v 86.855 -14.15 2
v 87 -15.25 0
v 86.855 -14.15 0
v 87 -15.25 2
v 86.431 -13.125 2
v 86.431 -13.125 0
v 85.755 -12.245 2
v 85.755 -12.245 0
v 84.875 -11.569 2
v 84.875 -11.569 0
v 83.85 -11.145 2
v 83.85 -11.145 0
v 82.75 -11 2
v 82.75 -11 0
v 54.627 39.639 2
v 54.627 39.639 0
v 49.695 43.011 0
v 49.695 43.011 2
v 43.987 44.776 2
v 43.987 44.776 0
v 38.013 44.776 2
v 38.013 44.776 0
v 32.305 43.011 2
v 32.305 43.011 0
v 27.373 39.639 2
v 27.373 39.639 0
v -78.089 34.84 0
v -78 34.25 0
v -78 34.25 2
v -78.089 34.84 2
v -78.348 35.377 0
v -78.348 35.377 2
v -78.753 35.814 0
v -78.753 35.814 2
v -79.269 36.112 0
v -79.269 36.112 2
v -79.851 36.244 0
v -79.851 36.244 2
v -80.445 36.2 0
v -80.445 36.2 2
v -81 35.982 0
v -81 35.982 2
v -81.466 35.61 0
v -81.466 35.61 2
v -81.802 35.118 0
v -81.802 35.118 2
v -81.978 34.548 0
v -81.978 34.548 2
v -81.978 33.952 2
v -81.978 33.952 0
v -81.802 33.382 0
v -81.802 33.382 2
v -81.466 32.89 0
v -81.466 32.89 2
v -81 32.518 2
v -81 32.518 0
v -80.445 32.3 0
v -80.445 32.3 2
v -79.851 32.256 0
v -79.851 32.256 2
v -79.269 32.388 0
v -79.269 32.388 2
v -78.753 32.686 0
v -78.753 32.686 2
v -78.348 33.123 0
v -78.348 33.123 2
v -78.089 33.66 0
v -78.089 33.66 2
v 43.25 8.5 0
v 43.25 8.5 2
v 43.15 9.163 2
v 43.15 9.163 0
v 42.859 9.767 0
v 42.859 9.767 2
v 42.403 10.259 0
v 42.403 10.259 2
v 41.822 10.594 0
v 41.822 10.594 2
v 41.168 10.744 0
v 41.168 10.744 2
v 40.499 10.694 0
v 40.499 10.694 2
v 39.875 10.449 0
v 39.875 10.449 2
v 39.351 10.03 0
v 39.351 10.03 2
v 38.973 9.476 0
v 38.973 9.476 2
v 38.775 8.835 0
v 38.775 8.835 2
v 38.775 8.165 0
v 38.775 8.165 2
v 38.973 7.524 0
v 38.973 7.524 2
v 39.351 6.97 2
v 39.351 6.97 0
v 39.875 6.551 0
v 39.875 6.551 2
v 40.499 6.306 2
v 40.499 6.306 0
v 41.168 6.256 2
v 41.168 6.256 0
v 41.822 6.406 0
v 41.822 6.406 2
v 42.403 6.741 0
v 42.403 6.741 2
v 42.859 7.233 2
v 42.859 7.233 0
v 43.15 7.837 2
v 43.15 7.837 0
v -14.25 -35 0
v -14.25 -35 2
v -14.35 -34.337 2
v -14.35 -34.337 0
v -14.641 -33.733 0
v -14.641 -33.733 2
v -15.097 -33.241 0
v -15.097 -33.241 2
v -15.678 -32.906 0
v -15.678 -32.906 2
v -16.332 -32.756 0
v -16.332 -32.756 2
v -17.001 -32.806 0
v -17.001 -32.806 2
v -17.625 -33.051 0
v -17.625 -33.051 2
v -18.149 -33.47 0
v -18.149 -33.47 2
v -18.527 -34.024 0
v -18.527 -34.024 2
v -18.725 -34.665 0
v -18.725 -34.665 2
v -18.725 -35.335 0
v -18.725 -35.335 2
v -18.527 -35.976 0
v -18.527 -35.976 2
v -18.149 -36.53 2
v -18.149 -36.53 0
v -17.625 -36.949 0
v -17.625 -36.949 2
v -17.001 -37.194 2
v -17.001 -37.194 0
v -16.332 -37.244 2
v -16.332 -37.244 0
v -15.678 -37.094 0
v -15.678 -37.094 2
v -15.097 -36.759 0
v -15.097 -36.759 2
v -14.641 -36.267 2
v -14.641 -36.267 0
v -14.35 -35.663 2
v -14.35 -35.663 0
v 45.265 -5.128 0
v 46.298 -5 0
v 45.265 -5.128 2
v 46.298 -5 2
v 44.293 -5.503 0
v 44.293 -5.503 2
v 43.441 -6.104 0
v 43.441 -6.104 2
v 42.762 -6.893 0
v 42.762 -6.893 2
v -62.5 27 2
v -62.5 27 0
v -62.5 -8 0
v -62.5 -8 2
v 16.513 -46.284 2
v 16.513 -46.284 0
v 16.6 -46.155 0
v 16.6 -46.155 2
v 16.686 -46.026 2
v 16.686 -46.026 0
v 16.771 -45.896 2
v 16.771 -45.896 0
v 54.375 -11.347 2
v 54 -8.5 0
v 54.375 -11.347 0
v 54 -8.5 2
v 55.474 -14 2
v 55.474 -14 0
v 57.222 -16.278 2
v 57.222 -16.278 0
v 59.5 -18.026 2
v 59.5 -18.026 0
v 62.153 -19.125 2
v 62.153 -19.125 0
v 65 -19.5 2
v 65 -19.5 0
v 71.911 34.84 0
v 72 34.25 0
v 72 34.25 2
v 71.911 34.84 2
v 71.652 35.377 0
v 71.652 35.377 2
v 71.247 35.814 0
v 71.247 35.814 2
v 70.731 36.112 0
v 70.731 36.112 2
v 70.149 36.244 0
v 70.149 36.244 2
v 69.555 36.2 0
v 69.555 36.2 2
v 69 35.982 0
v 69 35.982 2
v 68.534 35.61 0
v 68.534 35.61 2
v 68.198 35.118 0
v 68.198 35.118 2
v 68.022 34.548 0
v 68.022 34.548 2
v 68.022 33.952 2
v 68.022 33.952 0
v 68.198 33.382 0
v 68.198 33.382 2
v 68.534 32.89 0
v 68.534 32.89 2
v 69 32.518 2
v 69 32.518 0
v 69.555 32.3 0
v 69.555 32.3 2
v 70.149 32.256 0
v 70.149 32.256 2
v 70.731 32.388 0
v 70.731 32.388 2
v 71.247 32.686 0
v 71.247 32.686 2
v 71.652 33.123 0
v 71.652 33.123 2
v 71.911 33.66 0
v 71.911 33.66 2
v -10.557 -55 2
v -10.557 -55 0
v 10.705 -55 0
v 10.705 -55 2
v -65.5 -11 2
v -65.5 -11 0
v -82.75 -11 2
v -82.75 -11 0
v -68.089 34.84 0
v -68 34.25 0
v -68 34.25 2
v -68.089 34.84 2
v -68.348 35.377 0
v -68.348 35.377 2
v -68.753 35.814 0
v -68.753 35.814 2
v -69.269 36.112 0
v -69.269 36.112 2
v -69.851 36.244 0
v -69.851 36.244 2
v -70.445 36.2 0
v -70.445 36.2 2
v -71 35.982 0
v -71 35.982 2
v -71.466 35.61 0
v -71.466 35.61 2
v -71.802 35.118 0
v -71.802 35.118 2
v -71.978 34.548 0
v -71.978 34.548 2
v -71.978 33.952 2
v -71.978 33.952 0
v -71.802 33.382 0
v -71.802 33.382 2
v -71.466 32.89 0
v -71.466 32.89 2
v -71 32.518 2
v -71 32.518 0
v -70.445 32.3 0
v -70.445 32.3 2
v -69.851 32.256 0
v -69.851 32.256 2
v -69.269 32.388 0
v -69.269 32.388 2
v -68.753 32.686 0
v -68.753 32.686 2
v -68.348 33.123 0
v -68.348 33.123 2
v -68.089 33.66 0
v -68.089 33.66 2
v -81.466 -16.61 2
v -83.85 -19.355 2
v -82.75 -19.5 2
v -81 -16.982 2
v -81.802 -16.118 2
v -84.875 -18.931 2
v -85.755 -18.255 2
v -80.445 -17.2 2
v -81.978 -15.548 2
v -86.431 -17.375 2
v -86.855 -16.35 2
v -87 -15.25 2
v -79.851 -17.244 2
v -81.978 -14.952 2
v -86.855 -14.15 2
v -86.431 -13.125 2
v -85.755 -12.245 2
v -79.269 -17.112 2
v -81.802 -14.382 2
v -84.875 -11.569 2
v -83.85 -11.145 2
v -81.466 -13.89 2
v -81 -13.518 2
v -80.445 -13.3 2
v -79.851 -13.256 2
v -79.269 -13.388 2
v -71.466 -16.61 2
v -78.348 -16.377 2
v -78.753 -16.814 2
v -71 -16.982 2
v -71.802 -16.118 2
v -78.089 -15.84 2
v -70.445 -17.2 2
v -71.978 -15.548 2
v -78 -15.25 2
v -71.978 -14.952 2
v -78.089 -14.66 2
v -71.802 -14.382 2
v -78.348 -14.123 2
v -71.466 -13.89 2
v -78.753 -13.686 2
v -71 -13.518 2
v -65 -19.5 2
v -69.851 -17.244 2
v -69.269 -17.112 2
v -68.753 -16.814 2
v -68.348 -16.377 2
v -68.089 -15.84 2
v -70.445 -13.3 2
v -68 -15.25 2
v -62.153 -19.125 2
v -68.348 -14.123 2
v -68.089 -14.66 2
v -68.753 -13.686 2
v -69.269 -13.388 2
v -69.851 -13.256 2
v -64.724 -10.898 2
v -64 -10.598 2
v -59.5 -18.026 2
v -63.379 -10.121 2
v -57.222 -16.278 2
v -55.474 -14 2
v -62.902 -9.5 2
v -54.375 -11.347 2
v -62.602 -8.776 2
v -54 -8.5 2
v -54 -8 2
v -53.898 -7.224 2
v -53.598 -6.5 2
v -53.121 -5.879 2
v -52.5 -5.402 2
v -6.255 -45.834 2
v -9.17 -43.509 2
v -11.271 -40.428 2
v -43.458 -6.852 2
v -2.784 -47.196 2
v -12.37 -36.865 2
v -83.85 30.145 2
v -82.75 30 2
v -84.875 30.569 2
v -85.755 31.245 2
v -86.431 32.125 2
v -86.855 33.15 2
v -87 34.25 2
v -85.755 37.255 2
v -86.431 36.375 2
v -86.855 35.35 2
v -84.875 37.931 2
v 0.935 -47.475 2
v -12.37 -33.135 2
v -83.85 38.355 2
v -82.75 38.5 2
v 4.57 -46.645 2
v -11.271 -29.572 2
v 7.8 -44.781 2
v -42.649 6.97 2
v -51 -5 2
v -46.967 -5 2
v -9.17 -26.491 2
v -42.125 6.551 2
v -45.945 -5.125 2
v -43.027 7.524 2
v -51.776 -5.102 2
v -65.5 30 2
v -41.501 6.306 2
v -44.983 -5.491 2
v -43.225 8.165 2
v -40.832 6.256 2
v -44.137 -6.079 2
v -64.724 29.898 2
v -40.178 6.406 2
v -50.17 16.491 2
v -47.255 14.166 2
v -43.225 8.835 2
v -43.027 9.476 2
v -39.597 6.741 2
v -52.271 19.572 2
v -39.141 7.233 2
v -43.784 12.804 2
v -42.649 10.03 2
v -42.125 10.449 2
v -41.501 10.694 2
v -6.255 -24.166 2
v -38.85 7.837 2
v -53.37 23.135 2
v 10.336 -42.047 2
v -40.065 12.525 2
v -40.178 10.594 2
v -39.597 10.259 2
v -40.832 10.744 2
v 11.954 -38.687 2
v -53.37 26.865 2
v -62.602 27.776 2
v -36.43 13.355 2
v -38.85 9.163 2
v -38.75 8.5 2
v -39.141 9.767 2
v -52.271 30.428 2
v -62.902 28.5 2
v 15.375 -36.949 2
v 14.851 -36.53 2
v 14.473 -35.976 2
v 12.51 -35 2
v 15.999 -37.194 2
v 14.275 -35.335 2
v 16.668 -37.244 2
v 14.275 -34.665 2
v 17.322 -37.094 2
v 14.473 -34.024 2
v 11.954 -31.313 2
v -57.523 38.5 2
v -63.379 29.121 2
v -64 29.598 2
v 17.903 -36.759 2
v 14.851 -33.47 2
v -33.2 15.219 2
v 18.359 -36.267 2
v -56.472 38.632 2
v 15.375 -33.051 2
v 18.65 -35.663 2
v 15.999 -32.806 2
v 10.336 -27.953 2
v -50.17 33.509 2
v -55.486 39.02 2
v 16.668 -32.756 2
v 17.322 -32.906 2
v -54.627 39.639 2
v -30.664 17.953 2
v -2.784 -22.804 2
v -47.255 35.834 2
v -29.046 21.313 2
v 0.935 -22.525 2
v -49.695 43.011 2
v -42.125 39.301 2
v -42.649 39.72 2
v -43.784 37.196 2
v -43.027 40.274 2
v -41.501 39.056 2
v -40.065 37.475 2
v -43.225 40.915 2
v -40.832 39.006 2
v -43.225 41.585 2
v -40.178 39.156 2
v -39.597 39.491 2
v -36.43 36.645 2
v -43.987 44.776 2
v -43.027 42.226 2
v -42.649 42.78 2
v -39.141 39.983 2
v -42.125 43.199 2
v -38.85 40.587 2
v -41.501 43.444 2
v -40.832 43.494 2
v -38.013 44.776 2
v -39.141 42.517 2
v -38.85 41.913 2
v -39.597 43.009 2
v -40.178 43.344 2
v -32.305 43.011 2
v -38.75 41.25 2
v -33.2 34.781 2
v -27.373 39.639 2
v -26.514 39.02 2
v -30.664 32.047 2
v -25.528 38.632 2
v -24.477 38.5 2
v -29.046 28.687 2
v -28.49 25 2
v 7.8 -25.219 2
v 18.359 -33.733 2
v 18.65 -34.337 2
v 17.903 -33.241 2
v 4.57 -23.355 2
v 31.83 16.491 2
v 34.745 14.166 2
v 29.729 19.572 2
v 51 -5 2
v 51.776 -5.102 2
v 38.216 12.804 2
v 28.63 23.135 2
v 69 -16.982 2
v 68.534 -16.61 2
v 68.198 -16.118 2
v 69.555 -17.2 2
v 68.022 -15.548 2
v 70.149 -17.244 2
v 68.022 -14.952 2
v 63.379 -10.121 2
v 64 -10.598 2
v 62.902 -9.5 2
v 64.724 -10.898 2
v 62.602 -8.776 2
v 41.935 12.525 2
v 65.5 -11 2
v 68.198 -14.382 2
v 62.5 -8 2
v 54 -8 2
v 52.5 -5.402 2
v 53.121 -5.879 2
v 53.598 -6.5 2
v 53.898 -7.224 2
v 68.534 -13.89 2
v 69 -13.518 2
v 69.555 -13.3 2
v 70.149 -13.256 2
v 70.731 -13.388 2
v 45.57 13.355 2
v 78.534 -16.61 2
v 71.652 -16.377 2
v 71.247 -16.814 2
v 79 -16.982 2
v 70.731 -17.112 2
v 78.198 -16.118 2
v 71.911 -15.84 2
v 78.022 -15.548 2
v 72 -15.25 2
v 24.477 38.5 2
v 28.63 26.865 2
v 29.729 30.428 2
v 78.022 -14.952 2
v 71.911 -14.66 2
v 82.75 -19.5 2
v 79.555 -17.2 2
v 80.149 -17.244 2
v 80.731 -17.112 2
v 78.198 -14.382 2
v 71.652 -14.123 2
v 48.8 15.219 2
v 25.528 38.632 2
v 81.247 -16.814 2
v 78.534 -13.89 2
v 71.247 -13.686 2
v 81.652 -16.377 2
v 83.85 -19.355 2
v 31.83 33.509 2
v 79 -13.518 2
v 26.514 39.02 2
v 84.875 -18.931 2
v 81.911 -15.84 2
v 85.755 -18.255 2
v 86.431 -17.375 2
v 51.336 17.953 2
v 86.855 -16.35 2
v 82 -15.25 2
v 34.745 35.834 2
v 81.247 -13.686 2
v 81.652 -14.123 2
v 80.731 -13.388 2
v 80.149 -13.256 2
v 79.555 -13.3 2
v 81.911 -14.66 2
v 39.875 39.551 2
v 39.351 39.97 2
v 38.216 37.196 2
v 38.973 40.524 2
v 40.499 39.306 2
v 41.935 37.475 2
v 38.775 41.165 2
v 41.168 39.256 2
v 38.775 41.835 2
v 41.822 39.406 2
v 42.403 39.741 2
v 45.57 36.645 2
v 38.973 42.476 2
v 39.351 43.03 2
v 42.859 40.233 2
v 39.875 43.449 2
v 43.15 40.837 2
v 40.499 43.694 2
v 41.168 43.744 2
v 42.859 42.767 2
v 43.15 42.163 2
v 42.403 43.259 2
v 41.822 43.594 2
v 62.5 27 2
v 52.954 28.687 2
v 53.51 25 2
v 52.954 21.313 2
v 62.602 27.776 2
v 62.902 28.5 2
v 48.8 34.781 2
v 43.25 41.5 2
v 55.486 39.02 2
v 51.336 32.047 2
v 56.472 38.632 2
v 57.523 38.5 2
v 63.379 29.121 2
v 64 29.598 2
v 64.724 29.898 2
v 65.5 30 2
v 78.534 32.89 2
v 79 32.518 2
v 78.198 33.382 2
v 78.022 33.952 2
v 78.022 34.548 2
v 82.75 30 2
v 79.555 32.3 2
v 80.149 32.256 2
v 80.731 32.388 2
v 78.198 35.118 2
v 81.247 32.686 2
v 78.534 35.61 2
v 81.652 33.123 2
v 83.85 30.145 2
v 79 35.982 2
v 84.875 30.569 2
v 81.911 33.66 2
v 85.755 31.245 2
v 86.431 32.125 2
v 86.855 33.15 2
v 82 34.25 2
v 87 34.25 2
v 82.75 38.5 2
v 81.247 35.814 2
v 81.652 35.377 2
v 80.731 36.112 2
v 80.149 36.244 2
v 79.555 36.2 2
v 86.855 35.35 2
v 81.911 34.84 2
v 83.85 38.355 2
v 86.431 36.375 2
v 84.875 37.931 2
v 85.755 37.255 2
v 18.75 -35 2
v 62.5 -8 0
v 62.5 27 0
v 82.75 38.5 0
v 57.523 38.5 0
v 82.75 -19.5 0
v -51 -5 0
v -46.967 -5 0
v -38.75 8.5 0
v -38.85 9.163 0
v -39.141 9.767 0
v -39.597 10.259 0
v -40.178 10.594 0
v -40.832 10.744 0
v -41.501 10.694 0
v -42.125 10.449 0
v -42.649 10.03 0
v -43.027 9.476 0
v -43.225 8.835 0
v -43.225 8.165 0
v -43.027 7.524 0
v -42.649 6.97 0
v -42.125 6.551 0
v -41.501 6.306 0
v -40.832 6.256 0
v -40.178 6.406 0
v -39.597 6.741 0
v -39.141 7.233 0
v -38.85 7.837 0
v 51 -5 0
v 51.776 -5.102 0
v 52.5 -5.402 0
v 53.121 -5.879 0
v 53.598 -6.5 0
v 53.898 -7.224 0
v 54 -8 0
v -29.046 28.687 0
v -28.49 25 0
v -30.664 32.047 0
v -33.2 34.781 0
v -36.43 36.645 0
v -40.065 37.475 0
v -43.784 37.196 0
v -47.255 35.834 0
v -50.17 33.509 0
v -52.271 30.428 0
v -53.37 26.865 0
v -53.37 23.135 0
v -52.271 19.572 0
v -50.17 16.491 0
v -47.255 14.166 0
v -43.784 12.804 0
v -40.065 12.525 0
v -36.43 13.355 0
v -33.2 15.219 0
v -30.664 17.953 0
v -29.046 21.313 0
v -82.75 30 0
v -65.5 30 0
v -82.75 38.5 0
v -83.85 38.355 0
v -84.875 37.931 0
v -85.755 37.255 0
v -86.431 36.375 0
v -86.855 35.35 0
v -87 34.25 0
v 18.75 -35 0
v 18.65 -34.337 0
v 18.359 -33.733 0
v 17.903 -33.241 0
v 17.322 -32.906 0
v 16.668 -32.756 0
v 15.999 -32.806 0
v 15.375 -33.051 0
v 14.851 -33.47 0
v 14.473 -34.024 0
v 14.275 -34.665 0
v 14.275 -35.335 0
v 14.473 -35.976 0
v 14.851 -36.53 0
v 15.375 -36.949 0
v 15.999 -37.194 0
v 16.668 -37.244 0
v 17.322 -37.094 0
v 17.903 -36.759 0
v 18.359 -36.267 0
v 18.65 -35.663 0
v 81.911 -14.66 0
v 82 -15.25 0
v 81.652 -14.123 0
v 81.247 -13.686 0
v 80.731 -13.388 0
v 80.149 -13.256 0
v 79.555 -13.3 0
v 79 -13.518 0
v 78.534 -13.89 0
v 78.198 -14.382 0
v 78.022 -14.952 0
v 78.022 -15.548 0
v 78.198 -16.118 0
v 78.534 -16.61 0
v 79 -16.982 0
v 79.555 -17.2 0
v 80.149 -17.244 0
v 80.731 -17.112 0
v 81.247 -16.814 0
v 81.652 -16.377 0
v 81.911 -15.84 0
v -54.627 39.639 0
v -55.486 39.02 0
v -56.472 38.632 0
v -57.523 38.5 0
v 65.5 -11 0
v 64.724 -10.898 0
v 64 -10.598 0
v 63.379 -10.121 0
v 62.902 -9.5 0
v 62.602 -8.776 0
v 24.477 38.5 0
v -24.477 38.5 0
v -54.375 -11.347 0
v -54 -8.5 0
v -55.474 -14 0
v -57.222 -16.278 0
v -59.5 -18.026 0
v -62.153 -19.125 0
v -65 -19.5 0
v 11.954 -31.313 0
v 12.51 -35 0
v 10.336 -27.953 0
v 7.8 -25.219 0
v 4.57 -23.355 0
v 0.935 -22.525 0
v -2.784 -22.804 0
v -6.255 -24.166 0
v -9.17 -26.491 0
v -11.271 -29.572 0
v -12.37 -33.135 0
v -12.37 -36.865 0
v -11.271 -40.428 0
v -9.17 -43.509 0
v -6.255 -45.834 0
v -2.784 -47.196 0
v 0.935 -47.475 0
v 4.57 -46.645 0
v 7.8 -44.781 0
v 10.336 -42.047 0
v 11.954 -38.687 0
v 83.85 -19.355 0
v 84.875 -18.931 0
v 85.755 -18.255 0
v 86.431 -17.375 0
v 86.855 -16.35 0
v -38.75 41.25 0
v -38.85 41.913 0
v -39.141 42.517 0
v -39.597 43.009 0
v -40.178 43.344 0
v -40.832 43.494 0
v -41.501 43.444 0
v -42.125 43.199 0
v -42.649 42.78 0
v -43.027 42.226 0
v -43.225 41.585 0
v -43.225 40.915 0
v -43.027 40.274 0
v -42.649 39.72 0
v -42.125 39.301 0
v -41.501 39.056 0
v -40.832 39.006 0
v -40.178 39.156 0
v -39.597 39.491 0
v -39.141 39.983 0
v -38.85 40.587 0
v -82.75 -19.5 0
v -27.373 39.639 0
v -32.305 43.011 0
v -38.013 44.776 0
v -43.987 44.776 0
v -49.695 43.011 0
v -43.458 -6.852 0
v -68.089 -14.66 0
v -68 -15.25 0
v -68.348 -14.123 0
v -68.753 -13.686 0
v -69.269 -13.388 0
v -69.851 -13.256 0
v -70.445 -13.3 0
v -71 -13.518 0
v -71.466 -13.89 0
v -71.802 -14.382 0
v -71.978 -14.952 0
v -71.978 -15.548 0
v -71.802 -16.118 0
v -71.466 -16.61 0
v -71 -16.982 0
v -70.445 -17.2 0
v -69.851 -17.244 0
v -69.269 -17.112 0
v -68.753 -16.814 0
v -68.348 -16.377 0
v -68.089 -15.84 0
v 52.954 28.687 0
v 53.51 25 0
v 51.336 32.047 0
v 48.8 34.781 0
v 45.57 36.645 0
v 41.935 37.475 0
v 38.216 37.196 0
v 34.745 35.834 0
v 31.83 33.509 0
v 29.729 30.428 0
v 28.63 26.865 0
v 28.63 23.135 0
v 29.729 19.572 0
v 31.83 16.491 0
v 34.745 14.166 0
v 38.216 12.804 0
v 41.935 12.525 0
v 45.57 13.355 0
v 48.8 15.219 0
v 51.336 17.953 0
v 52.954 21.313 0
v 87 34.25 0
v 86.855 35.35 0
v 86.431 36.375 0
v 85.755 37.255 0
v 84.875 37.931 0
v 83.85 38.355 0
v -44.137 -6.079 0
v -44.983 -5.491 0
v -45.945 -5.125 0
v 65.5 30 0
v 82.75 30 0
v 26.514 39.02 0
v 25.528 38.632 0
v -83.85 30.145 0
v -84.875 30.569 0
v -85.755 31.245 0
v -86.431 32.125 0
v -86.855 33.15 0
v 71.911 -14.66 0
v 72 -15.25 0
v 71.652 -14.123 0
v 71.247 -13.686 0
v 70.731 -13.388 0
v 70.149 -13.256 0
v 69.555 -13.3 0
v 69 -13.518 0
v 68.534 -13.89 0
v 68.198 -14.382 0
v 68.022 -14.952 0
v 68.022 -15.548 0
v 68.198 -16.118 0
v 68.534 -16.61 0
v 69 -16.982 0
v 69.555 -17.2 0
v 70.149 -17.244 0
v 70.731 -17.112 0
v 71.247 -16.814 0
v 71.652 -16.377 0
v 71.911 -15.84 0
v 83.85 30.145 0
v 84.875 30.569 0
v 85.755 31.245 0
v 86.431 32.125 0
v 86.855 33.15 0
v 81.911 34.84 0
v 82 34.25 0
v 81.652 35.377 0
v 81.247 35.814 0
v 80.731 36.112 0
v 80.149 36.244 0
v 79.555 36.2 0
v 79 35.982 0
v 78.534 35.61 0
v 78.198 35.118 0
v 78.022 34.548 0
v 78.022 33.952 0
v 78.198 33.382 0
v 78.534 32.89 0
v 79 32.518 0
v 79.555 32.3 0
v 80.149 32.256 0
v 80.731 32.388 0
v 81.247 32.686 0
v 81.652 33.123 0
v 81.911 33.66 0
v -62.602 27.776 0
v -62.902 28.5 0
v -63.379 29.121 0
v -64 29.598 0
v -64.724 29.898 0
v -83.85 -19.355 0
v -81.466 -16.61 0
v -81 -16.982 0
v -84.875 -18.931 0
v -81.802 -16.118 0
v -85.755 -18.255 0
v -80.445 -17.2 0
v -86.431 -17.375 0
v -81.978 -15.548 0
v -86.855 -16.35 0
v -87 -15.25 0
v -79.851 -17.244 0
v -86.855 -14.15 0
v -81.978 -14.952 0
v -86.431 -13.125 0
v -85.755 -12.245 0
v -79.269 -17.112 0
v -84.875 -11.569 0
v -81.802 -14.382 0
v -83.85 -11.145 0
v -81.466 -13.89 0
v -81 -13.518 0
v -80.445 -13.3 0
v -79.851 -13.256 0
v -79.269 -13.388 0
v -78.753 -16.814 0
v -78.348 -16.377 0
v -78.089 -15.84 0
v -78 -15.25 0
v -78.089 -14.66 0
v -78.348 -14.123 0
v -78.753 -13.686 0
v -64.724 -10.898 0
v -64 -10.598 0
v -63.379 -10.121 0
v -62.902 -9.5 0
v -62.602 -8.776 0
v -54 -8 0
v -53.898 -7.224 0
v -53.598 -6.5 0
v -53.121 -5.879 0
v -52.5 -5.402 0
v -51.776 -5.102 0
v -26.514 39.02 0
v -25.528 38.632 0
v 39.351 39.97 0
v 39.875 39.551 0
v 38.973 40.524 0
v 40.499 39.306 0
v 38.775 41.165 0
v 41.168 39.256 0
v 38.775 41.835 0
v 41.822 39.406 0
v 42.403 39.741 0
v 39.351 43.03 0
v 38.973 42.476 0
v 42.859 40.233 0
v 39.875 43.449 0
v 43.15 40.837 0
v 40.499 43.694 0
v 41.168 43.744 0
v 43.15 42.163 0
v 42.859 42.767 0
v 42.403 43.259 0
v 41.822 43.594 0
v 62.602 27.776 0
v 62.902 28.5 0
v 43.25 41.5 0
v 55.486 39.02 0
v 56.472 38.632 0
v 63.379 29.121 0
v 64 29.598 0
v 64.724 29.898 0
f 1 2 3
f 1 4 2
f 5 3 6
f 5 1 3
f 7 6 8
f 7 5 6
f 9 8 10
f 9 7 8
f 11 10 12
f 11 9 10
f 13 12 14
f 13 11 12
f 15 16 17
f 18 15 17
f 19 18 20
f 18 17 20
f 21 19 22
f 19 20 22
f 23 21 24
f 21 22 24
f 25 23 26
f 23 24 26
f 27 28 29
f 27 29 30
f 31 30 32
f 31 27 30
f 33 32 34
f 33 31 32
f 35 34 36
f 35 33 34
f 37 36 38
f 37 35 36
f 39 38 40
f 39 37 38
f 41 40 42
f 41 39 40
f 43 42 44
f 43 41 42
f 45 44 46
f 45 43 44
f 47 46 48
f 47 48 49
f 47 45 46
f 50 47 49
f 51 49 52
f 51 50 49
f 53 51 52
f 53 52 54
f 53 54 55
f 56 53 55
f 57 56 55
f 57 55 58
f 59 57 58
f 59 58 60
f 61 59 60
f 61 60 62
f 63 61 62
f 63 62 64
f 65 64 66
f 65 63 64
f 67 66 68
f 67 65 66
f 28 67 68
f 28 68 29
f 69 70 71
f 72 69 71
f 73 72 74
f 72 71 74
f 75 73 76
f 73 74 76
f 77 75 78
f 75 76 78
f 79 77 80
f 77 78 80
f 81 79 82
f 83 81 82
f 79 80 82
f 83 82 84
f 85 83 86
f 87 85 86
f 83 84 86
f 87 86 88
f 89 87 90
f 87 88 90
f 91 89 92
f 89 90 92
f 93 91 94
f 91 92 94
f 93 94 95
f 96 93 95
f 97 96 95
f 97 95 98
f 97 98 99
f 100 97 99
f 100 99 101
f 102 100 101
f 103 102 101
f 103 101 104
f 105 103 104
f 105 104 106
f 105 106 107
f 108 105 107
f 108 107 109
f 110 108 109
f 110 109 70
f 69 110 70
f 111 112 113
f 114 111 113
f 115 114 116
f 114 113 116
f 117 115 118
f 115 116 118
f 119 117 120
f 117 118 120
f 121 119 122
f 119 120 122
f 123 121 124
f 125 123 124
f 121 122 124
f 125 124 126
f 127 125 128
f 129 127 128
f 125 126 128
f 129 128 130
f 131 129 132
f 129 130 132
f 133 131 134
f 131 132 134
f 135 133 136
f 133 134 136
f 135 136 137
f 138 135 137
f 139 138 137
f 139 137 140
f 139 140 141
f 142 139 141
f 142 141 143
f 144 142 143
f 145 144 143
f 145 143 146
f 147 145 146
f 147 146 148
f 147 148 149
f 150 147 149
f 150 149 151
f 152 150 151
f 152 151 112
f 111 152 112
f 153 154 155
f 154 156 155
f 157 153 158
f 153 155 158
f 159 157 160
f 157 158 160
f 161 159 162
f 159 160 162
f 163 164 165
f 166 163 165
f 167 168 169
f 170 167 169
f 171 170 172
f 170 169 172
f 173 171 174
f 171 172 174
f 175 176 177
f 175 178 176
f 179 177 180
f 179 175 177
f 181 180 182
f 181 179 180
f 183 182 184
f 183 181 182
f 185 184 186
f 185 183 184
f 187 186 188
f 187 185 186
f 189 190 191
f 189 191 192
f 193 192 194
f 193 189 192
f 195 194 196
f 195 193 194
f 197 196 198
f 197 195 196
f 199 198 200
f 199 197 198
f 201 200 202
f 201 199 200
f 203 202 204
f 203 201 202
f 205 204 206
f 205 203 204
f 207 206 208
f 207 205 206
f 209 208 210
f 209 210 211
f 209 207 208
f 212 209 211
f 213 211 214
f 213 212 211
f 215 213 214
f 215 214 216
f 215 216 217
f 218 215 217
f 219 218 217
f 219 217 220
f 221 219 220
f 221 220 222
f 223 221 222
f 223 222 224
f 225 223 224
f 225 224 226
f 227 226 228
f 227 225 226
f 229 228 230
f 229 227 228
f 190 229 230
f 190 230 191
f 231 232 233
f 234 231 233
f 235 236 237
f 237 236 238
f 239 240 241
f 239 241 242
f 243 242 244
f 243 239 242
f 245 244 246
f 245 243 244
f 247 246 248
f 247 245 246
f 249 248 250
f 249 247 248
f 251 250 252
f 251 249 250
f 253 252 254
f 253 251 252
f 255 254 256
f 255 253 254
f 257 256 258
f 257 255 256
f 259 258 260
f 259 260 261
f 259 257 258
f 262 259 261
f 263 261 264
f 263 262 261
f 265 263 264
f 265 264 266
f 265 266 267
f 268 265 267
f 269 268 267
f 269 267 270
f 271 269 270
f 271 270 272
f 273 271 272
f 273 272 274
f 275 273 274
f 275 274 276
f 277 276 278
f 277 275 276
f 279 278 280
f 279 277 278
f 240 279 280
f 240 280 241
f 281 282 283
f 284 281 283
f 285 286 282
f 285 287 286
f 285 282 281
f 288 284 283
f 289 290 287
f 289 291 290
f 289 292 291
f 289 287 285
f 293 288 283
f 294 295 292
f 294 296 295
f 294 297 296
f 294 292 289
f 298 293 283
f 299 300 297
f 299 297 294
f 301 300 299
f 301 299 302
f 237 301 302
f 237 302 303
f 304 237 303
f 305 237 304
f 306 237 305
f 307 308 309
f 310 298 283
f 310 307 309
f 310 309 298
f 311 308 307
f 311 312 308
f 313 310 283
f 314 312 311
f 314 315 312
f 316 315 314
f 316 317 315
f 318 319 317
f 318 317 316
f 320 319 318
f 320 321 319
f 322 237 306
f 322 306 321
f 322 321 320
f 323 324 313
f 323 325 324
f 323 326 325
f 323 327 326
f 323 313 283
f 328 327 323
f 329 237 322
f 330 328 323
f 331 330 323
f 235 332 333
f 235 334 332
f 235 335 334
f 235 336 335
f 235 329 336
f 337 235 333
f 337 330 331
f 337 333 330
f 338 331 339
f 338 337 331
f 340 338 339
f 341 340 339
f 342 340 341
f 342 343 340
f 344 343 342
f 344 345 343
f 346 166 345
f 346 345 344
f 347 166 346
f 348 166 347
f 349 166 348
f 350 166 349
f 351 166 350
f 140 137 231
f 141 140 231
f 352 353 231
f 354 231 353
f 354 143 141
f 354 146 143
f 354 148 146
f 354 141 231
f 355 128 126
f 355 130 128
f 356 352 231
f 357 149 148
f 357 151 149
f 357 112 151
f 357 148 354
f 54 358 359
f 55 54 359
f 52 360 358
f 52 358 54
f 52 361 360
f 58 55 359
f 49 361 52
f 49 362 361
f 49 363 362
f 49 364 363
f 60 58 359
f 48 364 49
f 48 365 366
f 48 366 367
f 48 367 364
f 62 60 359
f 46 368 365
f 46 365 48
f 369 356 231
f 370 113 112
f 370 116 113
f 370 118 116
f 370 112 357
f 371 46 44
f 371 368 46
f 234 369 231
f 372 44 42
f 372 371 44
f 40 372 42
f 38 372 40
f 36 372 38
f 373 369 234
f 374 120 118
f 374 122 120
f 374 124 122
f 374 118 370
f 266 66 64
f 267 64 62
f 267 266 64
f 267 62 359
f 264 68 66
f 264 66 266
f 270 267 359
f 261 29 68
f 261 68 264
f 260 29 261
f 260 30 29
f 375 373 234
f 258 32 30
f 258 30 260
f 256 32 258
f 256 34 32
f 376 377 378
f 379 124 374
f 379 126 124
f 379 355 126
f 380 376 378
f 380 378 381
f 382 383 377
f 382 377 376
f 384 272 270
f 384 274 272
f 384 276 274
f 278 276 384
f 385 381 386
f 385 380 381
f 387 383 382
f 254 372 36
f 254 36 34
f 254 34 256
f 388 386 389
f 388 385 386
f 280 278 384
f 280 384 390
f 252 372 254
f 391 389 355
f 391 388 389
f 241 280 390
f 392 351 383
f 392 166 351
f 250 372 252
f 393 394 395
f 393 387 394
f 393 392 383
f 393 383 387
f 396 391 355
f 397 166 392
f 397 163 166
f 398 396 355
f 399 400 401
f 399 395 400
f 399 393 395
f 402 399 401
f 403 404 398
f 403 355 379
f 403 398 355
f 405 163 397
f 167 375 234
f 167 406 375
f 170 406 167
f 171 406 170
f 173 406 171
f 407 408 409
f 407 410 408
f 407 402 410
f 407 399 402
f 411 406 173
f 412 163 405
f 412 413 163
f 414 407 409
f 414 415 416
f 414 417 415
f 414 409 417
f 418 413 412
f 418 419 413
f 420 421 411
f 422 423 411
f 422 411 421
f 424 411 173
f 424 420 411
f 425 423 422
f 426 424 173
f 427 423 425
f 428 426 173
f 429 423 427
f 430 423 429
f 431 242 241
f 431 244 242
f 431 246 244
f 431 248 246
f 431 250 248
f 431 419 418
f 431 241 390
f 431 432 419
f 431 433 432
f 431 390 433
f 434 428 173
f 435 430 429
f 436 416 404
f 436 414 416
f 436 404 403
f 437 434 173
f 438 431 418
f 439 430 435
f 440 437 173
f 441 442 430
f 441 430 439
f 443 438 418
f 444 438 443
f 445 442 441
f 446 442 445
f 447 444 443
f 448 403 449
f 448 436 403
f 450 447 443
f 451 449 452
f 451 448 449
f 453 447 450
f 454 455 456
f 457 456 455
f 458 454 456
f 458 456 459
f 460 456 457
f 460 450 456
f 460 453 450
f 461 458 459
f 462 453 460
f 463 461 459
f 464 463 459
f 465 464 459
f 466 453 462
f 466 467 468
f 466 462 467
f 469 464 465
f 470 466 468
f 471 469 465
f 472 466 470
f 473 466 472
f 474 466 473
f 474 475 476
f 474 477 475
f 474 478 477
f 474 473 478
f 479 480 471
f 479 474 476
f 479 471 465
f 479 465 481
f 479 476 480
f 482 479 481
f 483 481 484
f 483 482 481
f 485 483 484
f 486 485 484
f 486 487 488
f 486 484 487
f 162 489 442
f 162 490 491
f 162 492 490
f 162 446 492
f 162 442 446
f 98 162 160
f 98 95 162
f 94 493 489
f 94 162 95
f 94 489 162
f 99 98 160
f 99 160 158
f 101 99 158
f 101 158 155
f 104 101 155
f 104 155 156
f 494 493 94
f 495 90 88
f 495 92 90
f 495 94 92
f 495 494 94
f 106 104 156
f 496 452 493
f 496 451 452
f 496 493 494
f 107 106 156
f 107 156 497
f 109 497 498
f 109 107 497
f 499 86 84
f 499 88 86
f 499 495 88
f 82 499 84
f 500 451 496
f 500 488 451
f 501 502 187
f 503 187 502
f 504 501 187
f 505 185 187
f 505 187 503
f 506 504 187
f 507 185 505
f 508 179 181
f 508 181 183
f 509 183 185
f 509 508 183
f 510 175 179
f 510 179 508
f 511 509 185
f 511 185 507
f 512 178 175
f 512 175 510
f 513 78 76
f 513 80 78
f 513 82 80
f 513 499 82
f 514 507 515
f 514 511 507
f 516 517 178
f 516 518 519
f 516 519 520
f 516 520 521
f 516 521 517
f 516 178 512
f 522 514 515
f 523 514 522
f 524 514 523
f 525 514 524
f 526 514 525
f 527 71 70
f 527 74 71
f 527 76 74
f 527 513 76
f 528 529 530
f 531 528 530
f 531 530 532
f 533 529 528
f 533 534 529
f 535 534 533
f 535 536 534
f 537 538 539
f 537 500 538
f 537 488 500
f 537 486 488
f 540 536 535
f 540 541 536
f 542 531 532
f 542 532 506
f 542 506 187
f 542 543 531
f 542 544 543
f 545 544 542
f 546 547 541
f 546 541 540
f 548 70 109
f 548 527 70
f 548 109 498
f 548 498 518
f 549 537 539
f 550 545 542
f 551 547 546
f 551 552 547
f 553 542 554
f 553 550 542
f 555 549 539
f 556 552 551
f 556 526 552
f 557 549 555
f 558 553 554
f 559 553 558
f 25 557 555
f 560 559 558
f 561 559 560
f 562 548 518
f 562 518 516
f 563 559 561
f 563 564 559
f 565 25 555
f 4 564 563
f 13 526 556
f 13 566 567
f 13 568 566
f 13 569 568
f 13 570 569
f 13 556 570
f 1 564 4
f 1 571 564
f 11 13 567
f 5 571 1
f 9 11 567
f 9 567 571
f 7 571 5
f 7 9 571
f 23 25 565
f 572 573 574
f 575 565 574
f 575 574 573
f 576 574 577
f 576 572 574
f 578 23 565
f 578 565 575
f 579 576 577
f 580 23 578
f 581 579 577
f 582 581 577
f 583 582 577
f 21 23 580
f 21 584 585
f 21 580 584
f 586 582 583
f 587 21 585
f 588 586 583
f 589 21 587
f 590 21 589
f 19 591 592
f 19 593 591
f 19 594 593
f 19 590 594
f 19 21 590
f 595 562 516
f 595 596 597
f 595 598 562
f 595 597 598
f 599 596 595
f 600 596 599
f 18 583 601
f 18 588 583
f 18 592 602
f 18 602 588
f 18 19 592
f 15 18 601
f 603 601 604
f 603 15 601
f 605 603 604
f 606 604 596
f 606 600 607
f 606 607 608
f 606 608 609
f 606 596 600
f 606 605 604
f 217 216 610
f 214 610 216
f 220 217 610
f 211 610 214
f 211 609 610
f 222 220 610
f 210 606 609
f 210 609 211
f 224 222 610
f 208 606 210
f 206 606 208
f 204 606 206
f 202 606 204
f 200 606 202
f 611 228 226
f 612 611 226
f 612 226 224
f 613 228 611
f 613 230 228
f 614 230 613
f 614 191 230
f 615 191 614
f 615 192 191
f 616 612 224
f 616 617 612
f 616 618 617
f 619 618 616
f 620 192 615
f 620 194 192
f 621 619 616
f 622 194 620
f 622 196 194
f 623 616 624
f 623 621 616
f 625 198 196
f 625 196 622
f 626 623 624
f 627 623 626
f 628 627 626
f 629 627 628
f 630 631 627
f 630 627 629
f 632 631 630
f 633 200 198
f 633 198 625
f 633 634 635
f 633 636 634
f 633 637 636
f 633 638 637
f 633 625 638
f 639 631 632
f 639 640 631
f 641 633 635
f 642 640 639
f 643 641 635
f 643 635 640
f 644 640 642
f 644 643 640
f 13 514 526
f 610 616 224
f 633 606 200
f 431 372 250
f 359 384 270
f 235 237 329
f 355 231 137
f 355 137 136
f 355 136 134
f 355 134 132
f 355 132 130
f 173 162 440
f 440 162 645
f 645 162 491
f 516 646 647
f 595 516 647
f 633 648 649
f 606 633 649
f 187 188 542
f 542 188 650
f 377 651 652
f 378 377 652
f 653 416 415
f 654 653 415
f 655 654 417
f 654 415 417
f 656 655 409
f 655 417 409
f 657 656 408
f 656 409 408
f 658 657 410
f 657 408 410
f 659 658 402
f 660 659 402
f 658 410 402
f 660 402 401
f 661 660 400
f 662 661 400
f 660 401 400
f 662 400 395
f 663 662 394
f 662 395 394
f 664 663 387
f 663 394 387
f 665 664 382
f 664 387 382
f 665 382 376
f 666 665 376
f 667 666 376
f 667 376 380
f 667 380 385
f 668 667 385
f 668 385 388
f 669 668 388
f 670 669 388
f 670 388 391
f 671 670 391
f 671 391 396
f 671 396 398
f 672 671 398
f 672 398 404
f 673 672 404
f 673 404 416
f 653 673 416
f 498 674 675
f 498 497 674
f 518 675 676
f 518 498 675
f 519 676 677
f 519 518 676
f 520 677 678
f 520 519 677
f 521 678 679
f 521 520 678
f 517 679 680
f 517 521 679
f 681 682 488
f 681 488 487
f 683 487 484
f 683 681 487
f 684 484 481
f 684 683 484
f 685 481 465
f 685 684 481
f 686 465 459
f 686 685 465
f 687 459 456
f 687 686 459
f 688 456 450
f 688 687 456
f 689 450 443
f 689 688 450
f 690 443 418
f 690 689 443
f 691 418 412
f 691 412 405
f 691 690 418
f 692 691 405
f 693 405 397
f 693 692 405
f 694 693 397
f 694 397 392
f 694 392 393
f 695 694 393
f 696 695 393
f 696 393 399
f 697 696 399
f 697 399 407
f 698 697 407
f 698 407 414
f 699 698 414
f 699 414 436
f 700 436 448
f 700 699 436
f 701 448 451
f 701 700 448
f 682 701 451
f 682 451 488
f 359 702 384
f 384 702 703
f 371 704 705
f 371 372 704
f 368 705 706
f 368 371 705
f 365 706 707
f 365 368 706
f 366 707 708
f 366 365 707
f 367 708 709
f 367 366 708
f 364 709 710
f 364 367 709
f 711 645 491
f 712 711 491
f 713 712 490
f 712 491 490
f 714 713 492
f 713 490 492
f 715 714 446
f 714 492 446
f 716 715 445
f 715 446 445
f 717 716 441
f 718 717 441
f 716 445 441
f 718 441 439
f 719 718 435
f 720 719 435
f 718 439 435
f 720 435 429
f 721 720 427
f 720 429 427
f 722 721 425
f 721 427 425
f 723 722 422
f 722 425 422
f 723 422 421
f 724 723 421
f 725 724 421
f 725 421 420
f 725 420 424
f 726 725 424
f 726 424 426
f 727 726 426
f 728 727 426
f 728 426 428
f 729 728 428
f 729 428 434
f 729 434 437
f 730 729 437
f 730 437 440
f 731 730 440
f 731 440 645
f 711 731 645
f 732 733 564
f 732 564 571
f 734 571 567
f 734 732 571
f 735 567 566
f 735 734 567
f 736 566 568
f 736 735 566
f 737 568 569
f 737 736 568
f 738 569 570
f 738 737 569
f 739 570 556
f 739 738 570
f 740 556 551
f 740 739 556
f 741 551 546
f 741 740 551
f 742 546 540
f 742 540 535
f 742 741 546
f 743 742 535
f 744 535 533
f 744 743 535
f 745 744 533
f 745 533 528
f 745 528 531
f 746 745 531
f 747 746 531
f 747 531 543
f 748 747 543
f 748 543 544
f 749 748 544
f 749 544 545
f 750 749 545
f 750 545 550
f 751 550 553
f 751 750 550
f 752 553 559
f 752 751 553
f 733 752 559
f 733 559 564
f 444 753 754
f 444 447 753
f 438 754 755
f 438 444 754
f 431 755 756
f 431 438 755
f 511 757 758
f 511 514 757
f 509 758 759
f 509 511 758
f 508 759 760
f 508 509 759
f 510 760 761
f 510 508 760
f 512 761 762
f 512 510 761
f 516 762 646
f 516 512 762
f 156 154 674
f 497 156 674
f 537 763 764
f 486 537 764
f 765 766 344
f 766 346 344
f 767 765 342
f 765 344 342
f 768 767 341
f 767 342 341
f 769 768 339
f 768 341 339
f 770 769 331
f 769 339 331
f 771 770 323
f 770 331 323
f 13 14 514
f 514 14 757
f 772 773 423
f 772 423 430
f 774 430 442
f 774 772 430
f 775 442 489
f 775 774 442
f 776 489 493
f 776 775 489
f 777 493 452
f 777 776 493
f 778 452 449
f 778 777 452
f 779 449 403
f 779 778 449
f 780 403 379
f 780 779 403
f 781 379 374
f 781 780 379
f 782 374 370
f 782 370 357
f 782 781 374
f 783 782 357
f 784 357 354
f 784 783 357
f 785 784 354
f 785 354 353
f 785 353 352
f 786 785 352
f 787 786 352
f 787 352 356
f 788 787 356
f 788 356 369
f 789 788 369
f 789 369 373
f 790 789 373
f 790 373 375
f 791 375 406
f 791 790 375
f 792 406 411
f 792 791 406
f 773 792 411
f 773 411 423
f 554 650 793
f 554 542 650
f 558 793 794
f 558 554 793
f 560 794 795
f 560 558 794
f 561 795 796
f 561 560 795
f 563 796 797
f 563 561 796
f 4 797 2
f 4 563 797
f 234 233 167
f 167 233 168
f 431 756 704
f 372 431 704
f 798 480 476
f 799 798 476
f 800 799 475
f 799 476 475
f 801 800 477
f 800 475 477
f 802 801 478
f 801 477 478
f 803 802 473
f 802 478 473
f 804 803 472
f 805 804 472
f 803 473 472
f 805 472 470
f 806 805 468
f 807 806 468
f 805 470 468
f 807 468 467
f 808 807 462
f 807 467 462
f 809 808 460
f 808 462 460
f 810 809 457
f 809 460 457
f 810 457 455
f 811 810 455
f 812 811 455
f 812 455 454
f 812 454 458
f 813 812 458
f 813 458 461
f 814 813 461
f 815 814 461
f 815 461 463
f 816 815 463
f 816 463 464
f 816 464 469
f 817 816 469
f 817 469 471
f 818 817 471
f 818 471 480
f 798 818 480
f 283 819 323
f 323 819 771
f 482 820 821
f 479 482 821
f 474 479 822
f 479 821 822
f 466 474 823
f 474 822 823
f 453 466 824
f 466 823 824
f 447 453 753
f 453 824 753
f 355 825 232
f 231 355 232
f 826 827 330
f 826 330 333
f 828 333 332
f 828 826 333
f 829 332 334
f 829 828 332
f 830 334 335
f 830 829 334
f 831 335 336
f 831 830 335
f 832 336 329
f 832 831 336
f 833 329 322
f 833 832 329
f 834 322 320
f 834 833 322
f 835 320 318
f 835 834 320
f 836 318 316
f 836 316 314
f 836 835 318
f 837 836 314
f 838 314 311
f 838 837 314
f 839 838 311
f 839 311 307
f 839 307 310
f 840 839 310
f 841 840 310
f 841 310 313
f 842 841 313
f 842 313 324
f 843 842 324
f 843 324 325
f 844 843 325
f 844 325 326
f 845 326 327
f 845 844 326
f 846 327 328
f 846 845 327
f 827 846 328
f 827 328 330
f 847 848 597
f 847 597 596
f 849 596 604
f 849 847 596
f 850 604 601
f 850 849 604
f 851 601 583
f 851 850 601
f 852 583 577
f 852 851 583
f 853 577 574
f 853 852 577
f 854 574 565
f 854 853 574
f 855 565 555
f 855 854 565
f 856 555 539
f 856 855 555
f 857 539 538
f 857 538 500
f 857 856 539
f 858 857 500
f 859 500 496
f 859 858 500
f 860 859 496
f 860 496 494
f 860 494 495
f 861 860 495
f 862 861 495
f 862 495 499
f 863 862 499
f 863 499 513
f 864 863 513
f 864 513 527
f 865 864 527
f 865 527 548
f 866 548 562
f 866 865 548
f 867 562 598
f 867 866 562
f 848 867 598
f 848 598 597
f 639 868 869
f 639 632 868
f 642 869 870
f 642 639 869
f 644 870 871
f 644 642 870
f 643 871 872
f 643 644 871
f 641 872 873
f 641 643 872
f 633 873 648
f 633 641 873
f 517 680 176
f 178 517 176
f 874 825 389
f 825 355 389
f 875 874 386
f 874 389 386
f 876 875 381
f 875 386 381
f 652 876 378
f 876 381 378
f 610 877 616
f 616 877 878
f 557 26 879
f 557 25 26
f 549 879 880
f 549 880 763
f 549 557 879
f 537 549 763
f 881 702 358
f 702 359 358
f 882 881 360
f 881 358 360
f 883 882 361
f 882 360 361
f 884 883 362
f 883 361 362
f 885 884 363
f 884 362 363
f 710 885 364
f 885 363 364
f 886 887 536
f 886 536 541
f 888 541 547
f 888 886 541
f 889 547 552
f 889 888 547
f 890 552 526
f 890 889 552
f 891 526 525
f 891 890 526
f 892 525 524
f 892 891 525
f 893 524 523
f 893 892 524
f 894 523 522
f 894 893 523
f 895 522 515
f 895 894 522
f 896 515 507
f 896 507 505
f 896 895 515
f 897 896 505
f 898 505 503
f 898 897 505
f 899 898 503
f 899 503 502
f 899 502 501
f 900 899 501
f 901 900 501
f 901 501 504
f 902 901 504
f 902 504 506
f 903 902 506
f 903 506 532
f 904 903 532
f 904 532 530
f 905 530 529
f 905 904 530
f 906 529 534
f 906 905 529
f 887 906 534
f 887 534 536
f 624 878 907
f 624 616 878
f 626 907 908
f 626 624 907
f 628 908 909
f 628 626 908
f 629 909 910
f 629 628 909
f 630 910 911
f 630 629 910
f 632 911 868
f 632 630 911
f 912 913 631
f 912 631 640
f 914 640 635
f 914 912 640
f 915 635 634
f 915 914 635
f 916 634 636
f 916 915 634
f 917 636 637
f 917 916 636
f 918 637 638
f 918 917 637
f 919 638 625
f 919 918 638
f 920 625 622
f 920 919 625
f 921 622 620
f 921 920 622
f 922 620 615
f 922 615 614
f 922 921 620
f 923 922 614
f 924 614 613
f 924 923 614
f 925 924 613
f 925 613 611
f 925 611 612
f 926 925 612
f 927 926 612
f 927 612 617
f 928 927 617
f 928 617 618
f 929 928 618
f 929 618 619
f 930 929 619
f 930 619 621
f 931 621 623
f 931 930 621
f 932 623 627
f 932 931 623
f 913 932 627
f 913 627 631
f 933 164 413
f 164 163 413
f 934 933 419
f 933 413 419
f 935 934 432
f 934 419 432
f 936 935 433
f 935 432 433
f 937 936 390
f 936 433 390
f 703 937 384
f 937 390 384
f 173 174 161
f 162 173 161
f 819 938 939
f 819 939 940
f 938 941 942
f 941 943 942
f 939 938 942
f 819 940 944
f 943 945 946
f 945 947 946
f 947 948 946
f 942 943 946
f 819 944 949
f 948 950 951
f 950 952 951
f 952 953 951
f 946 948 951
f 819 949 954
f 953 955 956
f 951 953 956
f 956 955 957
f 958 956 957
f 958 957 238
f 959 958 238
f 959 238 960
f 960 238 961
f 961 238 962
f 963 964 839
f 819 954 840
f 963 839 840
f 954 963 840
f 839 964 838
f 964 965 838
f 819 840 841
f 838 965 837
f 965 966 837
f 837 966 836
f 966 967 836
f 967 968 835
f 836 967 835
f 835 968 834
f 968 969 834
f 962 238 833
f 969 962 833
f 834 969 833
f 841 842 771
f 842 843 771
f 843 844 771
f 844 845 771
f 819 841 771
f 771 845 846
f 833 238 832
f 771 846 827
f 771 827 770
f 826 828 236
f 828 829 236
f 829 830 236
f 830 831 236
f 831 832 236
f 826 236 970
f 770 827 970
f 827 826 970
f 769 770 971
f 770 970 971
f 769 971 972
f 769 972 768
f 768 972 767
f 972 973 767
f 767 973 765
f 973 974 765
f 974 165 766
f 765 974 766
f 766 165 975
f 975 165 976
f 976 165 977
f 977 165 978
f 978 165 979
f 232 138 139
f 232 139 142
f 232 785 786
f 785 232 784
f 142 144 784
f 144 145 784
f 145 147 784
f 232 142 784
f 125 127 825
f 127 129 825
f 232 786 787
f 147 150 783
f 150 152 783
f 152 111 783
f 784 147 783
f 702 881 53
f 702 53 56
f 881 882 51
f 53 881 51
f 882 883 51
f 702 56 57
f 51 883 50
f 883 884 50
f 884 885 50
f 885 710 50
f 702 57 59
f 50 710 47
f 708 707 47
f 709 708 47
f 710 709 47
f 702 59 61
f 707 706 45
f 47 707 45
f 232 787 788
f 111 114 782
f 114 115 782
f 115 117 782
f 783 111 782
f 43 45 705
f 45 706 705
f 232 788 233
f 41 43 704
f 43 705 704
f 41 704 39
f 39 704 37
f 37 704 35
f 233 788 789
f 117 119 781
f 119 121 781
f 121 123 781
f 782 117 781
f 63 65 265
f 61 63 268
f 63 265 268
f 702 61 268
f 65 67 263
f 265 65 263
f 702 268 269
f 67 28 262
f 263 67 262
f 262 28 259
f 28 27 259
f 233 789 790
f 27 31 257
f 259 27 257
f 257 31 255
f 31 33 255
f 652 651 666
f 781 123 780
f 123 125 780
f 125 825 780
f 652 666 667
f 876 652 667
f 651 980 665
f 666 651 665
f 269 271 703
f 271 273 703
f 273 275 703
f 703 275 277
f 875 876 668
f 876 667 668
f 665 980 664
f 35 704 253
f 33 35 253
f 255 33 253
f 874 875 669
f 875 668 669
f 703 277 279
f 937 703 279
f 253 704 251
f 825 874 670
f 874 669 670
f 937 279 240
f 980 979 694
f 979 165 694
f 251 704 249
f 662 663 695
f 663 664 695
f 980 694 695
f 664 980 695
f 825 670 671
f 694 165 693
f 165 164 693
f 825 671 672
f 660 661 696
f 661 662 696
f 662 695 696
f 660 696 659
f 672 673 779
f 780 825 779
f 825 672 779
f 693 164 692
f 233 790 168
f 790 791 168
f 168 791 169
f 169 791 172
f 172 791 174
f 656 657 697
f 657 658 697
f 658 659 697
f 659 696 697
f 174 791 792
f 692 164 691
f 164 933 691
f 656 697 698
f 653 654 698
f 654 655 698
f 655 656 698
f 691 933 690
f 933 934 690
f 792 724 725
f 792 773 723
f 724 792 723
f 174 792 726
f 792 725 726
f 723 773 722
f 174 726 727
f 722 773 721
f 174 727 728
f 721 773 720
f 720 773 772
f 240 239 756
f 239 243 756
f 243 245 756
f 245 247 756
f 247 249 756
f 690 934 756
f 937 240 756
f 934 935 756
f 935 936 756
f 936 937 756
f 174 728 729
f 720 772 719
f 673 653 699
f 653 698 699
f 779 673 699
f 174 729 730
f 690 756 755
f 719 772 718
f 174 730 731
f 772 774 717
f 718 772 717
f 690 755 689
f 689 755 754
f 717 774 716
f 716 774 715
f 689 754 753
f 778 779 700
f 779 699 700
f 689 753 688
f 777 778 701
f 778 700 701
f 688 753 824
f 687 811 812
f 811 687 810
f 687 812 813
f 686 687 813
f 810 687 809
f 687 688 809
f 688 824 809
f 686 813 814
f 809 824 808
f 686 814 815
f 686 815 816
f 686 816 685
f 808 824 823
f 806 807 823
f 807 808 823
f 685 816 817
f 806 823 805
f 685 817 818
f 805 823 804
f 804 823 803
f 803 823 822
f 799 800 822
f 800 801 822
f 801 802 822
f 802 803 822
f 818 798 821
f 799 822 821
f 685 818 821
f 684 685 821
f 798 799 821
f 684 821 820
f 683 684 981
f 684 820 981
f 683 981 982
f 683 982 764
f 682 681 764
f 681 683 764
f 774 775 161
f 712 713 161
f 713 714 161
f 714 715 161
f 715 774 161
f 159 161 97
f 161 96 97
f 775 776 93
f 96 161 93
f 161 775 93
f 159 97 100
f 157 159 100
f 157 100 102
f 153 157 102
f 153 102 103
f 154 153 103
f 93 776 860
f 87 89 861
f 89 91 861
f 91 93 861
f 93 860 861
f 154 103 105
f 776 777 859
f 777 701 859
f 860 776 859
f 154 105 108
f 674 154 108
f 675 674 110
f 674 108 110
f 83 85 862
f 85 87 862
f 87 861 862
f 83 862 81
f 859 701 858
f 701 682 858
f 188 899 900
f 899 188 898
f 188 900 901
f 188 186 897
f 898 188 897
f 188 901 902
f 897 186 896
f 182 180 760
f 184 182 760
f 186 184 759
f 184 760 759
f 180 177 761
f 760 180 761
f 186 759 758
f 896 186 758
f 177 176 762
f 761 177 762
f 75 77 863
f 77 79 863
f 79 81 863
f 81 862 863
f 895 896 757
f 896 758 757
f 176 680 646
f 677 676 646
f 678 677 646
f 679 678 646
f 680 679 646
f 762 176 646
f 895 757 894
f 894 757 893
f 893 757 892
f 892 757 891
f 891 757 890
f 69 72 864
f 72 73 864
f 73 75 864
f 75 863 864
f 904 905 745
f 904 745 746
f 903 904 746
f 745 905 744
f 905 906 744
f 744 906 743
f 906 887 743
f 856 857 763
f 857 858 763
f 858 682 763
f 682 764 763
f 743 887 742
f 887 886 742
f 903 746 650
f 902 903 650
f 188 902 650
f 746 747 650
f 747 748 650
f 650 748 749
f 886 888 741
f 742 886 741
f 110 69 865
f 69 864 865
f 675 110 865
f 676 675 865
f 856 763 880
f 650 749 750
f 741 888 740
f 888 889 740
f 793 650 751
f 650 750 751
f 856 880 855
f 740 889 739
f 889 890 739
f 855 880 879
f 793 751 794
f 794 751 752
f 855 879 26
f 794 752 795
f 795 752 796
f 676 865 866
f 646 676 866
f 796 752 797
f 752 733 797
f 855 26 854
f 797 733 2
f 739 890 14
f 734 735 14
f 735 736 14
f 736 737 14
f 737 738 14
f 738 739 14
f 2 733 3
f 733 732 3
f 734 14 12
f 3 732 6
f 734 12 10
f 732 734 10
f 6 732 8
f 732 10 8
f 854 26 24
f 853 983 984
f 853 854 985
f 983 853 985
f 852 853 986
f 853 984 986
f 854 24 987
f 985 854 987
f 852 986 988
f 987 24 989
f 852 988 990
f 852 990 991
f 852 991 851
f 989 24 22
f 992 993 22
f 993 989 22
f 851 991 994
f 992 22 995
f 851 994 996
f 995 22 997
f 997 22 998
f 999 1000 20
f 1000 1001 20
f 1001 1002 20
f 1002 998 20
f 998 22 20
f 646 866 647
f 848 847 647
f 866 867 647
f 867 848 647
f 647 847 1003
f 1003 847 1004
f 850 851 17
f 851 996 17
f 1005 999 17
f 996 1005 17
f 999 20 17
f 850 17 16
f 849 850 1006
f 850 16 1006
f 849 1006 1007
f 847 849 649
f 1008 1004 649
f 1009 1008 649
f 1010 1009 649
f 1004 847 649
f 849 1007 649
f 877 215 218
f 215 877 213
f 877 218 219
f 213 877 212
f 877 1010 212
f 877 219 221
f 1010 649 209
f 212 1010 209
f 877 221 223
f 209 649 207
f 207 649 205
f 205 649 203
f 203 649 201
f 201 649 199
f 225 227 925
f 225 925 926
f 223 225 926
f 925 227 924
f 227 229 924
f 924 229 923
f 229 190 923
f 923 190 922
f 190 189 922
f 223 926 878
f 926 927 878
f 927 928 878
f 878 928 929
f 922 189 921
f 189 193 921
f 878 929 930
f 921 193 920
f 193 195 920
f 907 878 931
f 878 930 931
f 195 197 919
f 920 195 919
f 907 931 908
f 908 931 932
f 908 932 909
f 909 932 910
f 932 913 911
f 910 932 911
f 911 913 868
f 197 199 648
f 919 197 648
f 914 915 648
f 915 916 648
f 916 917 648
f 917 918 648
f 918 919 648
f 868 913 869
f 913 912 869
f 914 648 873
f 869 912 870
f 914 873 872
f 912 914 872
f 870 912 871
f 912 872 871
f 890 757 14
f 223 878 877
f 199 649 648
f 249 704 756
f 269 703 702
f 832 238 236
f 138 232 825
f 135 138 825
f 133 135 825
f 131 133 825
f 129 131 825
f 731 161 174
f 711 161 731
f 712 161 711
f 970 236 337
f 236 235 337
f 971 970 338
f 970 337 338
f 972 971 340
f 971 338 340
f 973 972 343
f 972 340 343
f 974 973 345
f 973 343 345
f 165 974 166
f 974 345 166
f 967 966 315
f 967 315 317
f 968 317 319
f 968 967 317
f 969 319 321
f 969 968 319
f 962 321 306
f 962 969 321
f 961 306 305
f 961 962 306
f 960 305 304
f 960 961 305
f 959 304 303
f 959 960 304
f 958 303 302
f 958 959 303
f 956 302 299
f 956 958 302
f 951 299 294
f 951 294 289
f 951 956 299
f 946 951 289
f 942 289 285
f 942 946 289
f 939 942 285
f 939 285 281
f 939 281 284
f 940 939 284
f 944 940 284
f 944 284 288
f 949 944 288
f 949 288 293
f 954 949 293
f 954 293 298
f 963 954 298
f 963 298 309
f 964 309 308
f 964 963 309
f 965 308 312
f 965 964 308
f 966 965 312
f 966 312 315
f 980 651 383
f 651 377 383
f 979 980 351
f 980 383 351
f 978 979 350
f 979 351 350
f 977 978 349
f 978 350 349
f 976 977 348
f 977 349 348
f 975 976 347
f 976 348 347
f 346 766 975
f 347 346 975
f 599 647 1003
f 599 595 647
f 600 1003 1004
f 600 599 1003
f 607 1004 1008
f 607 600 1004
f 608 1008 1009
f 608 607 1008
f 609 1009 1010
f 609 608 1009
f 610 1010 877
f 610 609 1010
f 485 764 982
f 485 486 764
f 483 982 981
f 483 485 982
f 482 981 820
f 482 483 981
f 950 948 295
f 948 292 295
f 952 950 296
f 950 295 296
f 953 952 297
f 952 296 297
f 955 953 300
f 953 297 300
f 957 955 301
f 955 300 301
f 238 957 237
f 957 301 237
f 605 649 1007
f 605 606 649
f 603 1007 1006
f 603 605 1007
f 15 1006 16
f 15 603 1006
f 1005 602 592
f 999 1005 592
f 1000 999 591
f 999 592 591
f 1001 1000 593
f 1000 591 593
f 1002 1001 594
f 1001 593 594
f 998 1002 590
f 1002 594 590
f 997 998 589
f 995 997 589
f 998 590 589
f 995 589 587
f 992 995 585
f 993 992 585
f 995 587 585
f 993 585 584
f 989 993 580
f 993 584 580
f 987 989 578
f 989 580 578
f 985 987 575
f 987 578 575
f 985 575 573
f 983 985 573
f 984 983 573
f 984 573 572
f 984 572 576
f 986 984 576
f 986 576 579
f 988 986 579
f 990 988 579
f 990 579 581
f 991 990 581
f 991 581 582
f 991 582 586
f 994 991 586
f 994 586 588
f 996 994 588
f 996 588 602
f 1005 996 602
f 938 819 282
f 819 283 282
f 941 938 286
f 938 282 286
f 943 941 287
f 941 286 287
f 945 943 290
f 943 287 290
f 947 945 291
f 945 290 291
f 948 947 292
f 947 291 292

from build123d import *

# Parameters (mm, degrees)
SKETCH1_R           = 2
SKETCH1_R_2         = 12.51
BOSS_EXTRUDE1_DEPTH = 2
FILLET1_R           = 3
FILLET2_R           = 4.25
FILLET3_R           = 11
CUT_EXTRUDE1_REACH  = 104.947
SKETCH2_R           = 2.25


with BuildPart() as part:
    # Sketch1 → Boss-Extrude1 (new body)
    with BuildSketch(Plane.XY):
        with BuildLine():
            Line((44.023434797, -5), (54, -5))
            Line((54, -5), (54, -19.5))
            Line((54, -19.5), (87, -19.5))
            Line((87, -19.5), (87, -11))
            Line((87, -11), (62.5, -11))
            Line((62.5, -11), (62.5, 30))
            Line((62.5, 30), (87, 30))
            Line((87, 30), (87, 38.5))
            Line((87, 38.5), (55.756354563, 38.5))
            ThreePointArc((55.756354563, 38.5), (41, 45), (26.243645437, 38.5))
            Line((26.243645437, 38.5), (-26.243645437, 38.5))
            ThreePointArc((-26.243645437, 38.5), (-41, 45), (-55.756354563, 38.5))
            Line((-55.756354563, 38.5), (-87, 38.5))
            Line((-87, 38.5), (-87, 30))
            Line((-87, 30), (-62.5, 30))
            Line((-62.5, 30), (-62.5, -11))
            Line((-62.5, -11), (-87, -11))
            Line((-87, -11), (-87, -19.5))
            Line((-87, -19.5), (-54, -19.5))
            Line((-54, -19.5), (-54, -5))
            Line((-54, -5), (-44.723496399, -5))
            Line((-44.723496399, -5), (-10.556829732, -55))
            Line((-10.556829732, -55), (10.704632705, -55))
            Line((10.704632705, -55), (16.51289283, -46.283810101))
            ThreePointArc((16.51289283, -46.283810101), (16.643237983, -46.09065505), (16.771323869, -45.895994479))
            Line((16.771323869, -45.895994479), (44.023434797, -5))
        make_face()
        with Locations((-80, -15.25)):
            Circle(SKETCH1_R, mode=Mode.SUBTRACT)
        with Locations((-70, -15.25)):
            Circle(SKETCH1_R, mode=Mode.SUBTRACT)
        with Locations((0, -35)):
            Circle(SKETCH1_R_2, mode=Mode.SUBTRACT)
        with Locations((70, -15.25)):
            Circle(SKETCH1_R, mode=Mode.SUBTRACT)
        with Locations((80, -15.25)):
            Circle(SKETCH1_R, mode=Mode.SUBTRACT)
        with Locations((-80, 34.25)):
            Circle(SKETCH1_R, mode=Mode.SUBTRACT)
        with Locations((-70, 34.25)):
            Circle(SKETCH1_R, mode=Mode.SUBTRACT)
        with Locations((-41, 25)):
            Circle(SKETCH1_R_2, mode=Mode.SUBTRACT)
        with Locations((41, 25)):
            Circle(SKETCH1_R_2, mode=Mode.SUBTRACT)
        with Locations((70, 34.25)):
            Circle(SKETCH1_R, mode=Mode.SUBTRACT)
        with Locations((80, 34.25)):
            Circle(SKETCH1_R, mode=Mode.SUBTRACT)
    extrude(amount=BOSS_EXTRUDE1_DEPTH)

    # Fillet1
    fillet1_edges = [part.edges().sort_by_distance(p)[0] for p in [
        (62.5, 30, 1),
        (62.5, -11, 1),
        (54, -5, 1),
        (-54, -5, 1),
        (-62.5, -11, 1),
        (-62.5, 30, 1),
    ]]
    fillet(fillet1_edges, radius=FILLET1_R)

    # Fillet2
    fillet2_edges = [part.edges().sort_by_distance(p)[0] for p in [
        (87, 30, 1),
        (87, 38.5, 1),
        (87, -11, 1),
        (87, -19.5, 1),
        (-87, -19.5, 1),
        (-87, -11, 1),
        (-87, 30, 1),
        (-87, 38.5, 1),
        (26.243645437, 38.5, 1),
        (55.756354563, 38.5, 1),
        (-55.756354563, 38.5, 1),
        (-26.243645437, 38.5, 1),
        (44.023434797, -5, 1),
        (-44.723496399, -5, 1),
    ]]
    fillet(fillet2_edges, radius=FILLET2_R - 0.0001)  # a hair under: the kernel refuses the full size

    # Fillet3
    fillet3_edges = [part.edges().sort_by_distance(p)[0] for p in [
        (54, -19.5, 1),
        (-54, -19.5, 1),
    ]]
    fillet(fillet3_edges, radius=FILLET3_R)

    # Sketch2 → Cut-Extrude1 (cut, up to next)
    with BuildSketch(Plane.XY.offset(2), mode=Mode.PRIVATE) as cut_extrude1_sk1:
        with Locations((-41, 41.25)):
            Circle(SKETCH2_R)
    cut_extrude1_tool1 = extrude(cut_extrude1_sk1.sketch, amount=-CUT_EXTRUDE1_REACH, mode=Mode.PRIVATE) & part.part
    # Sketch2 → Cut-Extrude1 (cut, up to next)
    with BuildSketch(Plane.XY.offset(2), mode=Mode.PRIVATE) as cut_extrude1_sk2:
        with Locations((-41, 8.5)):
            Circle(SKETCH2_R)
    cut_extrude1_tool2 = extrude(cut_extrude1_sk2.sketch, amount=-CUT_EXTRUDE1_REACH, mode=Mode.PRIVATE) & part.part
    # Sketch2 → Cut-Extrude1 (cut, up to next)
    with BuildSketch(Plane.XY.offset(2), mode=Mode.PRIVATE) as cut_extrude1_sk3:
        with Locations((41, 8.5)):
            Circle(SKETCH2_R)
    cut_extrude1_tool3 = extrude(cut_extrude1_sk3.sketch, amount=-CUT_EXTRUDE1_REACH, mode=Mode.PRIVATE) & part.part
    # Sketch2 → Cut-Extrude1 (cut, up to next)
    with BuildSketch(Plane.XY.offset(2), mode=Mode.PRIVATE) as cut_extrude1_sk4:
        with Locations((41, 41.5)):
            Circle(SKETCH2_R)
    cut_extrude1_tool4 = extrude(cut_extrude1_sk4.sketch, amount=-CUT_EXTRUDE1_REACH, mode=Mode.PRIVATE) & part.part
    # Sketch2 → Cut-Extrude1 (cut, up to next)
    with BuildSketch(Plane.XY.offset(2), mode=Mode.PRIVATE) as cut_extrude1_sk5:
        with Locations((-16.5, -35)):
            Circle(SKETCH2_R)
    cut_extrude1_tool5 = extrude(cut_extrude1_sk5.sketch, amount=-CUT_EXTRUDE1_REACH, mode=Mode.PRIVATE) & part.part
    # Sketch2 → Cut-Extrude1 (cut, up to next)
    with BuildSketch(Plane.XY.offset(2), mode=Mode.PRIVATE) as cut_extrude1_sk6:
        with Locations((16.5, -35)):
            Circle(SKETCH2_R)
    cut_extrude1_tool6 = extrude(cut_extrude1_sk6.sketch, amount=-CUT_EXTRUDE1_REACH, mode=Mode.PRIVATE) & part.part
    add(cut_extrude1_tool1.solids().sort_by_distance((-41, 41.25, 2))[0], mode=Mode.SUBTRACT)
    add(cut_extrude1_tool2.solids().sort_by_distance((-41, 8.5, 2))[0], mode=Mode.SUBTRACT)
    add(cut_extrude1_tool3.solids().sort_by_distance((41, 8.5, 2))[0], mode=Mode.SUBTRACT)
    add(cut_extrude1_tool4.solids().sort_by_distance((41, 41.5, 2))[0], mode=Mode.SUBTRACT)
    add(cut_extrude1_tool5.solids().sort_by_distance((-16.5, -35, 2))[0], mode=Mode.SUBTRACT)
    add(cut_extrude1_tool6.solids().sort_by_distance((16.5, -35, 2))[0], mode=Mode.SUBTRACT)


solid = part.part
